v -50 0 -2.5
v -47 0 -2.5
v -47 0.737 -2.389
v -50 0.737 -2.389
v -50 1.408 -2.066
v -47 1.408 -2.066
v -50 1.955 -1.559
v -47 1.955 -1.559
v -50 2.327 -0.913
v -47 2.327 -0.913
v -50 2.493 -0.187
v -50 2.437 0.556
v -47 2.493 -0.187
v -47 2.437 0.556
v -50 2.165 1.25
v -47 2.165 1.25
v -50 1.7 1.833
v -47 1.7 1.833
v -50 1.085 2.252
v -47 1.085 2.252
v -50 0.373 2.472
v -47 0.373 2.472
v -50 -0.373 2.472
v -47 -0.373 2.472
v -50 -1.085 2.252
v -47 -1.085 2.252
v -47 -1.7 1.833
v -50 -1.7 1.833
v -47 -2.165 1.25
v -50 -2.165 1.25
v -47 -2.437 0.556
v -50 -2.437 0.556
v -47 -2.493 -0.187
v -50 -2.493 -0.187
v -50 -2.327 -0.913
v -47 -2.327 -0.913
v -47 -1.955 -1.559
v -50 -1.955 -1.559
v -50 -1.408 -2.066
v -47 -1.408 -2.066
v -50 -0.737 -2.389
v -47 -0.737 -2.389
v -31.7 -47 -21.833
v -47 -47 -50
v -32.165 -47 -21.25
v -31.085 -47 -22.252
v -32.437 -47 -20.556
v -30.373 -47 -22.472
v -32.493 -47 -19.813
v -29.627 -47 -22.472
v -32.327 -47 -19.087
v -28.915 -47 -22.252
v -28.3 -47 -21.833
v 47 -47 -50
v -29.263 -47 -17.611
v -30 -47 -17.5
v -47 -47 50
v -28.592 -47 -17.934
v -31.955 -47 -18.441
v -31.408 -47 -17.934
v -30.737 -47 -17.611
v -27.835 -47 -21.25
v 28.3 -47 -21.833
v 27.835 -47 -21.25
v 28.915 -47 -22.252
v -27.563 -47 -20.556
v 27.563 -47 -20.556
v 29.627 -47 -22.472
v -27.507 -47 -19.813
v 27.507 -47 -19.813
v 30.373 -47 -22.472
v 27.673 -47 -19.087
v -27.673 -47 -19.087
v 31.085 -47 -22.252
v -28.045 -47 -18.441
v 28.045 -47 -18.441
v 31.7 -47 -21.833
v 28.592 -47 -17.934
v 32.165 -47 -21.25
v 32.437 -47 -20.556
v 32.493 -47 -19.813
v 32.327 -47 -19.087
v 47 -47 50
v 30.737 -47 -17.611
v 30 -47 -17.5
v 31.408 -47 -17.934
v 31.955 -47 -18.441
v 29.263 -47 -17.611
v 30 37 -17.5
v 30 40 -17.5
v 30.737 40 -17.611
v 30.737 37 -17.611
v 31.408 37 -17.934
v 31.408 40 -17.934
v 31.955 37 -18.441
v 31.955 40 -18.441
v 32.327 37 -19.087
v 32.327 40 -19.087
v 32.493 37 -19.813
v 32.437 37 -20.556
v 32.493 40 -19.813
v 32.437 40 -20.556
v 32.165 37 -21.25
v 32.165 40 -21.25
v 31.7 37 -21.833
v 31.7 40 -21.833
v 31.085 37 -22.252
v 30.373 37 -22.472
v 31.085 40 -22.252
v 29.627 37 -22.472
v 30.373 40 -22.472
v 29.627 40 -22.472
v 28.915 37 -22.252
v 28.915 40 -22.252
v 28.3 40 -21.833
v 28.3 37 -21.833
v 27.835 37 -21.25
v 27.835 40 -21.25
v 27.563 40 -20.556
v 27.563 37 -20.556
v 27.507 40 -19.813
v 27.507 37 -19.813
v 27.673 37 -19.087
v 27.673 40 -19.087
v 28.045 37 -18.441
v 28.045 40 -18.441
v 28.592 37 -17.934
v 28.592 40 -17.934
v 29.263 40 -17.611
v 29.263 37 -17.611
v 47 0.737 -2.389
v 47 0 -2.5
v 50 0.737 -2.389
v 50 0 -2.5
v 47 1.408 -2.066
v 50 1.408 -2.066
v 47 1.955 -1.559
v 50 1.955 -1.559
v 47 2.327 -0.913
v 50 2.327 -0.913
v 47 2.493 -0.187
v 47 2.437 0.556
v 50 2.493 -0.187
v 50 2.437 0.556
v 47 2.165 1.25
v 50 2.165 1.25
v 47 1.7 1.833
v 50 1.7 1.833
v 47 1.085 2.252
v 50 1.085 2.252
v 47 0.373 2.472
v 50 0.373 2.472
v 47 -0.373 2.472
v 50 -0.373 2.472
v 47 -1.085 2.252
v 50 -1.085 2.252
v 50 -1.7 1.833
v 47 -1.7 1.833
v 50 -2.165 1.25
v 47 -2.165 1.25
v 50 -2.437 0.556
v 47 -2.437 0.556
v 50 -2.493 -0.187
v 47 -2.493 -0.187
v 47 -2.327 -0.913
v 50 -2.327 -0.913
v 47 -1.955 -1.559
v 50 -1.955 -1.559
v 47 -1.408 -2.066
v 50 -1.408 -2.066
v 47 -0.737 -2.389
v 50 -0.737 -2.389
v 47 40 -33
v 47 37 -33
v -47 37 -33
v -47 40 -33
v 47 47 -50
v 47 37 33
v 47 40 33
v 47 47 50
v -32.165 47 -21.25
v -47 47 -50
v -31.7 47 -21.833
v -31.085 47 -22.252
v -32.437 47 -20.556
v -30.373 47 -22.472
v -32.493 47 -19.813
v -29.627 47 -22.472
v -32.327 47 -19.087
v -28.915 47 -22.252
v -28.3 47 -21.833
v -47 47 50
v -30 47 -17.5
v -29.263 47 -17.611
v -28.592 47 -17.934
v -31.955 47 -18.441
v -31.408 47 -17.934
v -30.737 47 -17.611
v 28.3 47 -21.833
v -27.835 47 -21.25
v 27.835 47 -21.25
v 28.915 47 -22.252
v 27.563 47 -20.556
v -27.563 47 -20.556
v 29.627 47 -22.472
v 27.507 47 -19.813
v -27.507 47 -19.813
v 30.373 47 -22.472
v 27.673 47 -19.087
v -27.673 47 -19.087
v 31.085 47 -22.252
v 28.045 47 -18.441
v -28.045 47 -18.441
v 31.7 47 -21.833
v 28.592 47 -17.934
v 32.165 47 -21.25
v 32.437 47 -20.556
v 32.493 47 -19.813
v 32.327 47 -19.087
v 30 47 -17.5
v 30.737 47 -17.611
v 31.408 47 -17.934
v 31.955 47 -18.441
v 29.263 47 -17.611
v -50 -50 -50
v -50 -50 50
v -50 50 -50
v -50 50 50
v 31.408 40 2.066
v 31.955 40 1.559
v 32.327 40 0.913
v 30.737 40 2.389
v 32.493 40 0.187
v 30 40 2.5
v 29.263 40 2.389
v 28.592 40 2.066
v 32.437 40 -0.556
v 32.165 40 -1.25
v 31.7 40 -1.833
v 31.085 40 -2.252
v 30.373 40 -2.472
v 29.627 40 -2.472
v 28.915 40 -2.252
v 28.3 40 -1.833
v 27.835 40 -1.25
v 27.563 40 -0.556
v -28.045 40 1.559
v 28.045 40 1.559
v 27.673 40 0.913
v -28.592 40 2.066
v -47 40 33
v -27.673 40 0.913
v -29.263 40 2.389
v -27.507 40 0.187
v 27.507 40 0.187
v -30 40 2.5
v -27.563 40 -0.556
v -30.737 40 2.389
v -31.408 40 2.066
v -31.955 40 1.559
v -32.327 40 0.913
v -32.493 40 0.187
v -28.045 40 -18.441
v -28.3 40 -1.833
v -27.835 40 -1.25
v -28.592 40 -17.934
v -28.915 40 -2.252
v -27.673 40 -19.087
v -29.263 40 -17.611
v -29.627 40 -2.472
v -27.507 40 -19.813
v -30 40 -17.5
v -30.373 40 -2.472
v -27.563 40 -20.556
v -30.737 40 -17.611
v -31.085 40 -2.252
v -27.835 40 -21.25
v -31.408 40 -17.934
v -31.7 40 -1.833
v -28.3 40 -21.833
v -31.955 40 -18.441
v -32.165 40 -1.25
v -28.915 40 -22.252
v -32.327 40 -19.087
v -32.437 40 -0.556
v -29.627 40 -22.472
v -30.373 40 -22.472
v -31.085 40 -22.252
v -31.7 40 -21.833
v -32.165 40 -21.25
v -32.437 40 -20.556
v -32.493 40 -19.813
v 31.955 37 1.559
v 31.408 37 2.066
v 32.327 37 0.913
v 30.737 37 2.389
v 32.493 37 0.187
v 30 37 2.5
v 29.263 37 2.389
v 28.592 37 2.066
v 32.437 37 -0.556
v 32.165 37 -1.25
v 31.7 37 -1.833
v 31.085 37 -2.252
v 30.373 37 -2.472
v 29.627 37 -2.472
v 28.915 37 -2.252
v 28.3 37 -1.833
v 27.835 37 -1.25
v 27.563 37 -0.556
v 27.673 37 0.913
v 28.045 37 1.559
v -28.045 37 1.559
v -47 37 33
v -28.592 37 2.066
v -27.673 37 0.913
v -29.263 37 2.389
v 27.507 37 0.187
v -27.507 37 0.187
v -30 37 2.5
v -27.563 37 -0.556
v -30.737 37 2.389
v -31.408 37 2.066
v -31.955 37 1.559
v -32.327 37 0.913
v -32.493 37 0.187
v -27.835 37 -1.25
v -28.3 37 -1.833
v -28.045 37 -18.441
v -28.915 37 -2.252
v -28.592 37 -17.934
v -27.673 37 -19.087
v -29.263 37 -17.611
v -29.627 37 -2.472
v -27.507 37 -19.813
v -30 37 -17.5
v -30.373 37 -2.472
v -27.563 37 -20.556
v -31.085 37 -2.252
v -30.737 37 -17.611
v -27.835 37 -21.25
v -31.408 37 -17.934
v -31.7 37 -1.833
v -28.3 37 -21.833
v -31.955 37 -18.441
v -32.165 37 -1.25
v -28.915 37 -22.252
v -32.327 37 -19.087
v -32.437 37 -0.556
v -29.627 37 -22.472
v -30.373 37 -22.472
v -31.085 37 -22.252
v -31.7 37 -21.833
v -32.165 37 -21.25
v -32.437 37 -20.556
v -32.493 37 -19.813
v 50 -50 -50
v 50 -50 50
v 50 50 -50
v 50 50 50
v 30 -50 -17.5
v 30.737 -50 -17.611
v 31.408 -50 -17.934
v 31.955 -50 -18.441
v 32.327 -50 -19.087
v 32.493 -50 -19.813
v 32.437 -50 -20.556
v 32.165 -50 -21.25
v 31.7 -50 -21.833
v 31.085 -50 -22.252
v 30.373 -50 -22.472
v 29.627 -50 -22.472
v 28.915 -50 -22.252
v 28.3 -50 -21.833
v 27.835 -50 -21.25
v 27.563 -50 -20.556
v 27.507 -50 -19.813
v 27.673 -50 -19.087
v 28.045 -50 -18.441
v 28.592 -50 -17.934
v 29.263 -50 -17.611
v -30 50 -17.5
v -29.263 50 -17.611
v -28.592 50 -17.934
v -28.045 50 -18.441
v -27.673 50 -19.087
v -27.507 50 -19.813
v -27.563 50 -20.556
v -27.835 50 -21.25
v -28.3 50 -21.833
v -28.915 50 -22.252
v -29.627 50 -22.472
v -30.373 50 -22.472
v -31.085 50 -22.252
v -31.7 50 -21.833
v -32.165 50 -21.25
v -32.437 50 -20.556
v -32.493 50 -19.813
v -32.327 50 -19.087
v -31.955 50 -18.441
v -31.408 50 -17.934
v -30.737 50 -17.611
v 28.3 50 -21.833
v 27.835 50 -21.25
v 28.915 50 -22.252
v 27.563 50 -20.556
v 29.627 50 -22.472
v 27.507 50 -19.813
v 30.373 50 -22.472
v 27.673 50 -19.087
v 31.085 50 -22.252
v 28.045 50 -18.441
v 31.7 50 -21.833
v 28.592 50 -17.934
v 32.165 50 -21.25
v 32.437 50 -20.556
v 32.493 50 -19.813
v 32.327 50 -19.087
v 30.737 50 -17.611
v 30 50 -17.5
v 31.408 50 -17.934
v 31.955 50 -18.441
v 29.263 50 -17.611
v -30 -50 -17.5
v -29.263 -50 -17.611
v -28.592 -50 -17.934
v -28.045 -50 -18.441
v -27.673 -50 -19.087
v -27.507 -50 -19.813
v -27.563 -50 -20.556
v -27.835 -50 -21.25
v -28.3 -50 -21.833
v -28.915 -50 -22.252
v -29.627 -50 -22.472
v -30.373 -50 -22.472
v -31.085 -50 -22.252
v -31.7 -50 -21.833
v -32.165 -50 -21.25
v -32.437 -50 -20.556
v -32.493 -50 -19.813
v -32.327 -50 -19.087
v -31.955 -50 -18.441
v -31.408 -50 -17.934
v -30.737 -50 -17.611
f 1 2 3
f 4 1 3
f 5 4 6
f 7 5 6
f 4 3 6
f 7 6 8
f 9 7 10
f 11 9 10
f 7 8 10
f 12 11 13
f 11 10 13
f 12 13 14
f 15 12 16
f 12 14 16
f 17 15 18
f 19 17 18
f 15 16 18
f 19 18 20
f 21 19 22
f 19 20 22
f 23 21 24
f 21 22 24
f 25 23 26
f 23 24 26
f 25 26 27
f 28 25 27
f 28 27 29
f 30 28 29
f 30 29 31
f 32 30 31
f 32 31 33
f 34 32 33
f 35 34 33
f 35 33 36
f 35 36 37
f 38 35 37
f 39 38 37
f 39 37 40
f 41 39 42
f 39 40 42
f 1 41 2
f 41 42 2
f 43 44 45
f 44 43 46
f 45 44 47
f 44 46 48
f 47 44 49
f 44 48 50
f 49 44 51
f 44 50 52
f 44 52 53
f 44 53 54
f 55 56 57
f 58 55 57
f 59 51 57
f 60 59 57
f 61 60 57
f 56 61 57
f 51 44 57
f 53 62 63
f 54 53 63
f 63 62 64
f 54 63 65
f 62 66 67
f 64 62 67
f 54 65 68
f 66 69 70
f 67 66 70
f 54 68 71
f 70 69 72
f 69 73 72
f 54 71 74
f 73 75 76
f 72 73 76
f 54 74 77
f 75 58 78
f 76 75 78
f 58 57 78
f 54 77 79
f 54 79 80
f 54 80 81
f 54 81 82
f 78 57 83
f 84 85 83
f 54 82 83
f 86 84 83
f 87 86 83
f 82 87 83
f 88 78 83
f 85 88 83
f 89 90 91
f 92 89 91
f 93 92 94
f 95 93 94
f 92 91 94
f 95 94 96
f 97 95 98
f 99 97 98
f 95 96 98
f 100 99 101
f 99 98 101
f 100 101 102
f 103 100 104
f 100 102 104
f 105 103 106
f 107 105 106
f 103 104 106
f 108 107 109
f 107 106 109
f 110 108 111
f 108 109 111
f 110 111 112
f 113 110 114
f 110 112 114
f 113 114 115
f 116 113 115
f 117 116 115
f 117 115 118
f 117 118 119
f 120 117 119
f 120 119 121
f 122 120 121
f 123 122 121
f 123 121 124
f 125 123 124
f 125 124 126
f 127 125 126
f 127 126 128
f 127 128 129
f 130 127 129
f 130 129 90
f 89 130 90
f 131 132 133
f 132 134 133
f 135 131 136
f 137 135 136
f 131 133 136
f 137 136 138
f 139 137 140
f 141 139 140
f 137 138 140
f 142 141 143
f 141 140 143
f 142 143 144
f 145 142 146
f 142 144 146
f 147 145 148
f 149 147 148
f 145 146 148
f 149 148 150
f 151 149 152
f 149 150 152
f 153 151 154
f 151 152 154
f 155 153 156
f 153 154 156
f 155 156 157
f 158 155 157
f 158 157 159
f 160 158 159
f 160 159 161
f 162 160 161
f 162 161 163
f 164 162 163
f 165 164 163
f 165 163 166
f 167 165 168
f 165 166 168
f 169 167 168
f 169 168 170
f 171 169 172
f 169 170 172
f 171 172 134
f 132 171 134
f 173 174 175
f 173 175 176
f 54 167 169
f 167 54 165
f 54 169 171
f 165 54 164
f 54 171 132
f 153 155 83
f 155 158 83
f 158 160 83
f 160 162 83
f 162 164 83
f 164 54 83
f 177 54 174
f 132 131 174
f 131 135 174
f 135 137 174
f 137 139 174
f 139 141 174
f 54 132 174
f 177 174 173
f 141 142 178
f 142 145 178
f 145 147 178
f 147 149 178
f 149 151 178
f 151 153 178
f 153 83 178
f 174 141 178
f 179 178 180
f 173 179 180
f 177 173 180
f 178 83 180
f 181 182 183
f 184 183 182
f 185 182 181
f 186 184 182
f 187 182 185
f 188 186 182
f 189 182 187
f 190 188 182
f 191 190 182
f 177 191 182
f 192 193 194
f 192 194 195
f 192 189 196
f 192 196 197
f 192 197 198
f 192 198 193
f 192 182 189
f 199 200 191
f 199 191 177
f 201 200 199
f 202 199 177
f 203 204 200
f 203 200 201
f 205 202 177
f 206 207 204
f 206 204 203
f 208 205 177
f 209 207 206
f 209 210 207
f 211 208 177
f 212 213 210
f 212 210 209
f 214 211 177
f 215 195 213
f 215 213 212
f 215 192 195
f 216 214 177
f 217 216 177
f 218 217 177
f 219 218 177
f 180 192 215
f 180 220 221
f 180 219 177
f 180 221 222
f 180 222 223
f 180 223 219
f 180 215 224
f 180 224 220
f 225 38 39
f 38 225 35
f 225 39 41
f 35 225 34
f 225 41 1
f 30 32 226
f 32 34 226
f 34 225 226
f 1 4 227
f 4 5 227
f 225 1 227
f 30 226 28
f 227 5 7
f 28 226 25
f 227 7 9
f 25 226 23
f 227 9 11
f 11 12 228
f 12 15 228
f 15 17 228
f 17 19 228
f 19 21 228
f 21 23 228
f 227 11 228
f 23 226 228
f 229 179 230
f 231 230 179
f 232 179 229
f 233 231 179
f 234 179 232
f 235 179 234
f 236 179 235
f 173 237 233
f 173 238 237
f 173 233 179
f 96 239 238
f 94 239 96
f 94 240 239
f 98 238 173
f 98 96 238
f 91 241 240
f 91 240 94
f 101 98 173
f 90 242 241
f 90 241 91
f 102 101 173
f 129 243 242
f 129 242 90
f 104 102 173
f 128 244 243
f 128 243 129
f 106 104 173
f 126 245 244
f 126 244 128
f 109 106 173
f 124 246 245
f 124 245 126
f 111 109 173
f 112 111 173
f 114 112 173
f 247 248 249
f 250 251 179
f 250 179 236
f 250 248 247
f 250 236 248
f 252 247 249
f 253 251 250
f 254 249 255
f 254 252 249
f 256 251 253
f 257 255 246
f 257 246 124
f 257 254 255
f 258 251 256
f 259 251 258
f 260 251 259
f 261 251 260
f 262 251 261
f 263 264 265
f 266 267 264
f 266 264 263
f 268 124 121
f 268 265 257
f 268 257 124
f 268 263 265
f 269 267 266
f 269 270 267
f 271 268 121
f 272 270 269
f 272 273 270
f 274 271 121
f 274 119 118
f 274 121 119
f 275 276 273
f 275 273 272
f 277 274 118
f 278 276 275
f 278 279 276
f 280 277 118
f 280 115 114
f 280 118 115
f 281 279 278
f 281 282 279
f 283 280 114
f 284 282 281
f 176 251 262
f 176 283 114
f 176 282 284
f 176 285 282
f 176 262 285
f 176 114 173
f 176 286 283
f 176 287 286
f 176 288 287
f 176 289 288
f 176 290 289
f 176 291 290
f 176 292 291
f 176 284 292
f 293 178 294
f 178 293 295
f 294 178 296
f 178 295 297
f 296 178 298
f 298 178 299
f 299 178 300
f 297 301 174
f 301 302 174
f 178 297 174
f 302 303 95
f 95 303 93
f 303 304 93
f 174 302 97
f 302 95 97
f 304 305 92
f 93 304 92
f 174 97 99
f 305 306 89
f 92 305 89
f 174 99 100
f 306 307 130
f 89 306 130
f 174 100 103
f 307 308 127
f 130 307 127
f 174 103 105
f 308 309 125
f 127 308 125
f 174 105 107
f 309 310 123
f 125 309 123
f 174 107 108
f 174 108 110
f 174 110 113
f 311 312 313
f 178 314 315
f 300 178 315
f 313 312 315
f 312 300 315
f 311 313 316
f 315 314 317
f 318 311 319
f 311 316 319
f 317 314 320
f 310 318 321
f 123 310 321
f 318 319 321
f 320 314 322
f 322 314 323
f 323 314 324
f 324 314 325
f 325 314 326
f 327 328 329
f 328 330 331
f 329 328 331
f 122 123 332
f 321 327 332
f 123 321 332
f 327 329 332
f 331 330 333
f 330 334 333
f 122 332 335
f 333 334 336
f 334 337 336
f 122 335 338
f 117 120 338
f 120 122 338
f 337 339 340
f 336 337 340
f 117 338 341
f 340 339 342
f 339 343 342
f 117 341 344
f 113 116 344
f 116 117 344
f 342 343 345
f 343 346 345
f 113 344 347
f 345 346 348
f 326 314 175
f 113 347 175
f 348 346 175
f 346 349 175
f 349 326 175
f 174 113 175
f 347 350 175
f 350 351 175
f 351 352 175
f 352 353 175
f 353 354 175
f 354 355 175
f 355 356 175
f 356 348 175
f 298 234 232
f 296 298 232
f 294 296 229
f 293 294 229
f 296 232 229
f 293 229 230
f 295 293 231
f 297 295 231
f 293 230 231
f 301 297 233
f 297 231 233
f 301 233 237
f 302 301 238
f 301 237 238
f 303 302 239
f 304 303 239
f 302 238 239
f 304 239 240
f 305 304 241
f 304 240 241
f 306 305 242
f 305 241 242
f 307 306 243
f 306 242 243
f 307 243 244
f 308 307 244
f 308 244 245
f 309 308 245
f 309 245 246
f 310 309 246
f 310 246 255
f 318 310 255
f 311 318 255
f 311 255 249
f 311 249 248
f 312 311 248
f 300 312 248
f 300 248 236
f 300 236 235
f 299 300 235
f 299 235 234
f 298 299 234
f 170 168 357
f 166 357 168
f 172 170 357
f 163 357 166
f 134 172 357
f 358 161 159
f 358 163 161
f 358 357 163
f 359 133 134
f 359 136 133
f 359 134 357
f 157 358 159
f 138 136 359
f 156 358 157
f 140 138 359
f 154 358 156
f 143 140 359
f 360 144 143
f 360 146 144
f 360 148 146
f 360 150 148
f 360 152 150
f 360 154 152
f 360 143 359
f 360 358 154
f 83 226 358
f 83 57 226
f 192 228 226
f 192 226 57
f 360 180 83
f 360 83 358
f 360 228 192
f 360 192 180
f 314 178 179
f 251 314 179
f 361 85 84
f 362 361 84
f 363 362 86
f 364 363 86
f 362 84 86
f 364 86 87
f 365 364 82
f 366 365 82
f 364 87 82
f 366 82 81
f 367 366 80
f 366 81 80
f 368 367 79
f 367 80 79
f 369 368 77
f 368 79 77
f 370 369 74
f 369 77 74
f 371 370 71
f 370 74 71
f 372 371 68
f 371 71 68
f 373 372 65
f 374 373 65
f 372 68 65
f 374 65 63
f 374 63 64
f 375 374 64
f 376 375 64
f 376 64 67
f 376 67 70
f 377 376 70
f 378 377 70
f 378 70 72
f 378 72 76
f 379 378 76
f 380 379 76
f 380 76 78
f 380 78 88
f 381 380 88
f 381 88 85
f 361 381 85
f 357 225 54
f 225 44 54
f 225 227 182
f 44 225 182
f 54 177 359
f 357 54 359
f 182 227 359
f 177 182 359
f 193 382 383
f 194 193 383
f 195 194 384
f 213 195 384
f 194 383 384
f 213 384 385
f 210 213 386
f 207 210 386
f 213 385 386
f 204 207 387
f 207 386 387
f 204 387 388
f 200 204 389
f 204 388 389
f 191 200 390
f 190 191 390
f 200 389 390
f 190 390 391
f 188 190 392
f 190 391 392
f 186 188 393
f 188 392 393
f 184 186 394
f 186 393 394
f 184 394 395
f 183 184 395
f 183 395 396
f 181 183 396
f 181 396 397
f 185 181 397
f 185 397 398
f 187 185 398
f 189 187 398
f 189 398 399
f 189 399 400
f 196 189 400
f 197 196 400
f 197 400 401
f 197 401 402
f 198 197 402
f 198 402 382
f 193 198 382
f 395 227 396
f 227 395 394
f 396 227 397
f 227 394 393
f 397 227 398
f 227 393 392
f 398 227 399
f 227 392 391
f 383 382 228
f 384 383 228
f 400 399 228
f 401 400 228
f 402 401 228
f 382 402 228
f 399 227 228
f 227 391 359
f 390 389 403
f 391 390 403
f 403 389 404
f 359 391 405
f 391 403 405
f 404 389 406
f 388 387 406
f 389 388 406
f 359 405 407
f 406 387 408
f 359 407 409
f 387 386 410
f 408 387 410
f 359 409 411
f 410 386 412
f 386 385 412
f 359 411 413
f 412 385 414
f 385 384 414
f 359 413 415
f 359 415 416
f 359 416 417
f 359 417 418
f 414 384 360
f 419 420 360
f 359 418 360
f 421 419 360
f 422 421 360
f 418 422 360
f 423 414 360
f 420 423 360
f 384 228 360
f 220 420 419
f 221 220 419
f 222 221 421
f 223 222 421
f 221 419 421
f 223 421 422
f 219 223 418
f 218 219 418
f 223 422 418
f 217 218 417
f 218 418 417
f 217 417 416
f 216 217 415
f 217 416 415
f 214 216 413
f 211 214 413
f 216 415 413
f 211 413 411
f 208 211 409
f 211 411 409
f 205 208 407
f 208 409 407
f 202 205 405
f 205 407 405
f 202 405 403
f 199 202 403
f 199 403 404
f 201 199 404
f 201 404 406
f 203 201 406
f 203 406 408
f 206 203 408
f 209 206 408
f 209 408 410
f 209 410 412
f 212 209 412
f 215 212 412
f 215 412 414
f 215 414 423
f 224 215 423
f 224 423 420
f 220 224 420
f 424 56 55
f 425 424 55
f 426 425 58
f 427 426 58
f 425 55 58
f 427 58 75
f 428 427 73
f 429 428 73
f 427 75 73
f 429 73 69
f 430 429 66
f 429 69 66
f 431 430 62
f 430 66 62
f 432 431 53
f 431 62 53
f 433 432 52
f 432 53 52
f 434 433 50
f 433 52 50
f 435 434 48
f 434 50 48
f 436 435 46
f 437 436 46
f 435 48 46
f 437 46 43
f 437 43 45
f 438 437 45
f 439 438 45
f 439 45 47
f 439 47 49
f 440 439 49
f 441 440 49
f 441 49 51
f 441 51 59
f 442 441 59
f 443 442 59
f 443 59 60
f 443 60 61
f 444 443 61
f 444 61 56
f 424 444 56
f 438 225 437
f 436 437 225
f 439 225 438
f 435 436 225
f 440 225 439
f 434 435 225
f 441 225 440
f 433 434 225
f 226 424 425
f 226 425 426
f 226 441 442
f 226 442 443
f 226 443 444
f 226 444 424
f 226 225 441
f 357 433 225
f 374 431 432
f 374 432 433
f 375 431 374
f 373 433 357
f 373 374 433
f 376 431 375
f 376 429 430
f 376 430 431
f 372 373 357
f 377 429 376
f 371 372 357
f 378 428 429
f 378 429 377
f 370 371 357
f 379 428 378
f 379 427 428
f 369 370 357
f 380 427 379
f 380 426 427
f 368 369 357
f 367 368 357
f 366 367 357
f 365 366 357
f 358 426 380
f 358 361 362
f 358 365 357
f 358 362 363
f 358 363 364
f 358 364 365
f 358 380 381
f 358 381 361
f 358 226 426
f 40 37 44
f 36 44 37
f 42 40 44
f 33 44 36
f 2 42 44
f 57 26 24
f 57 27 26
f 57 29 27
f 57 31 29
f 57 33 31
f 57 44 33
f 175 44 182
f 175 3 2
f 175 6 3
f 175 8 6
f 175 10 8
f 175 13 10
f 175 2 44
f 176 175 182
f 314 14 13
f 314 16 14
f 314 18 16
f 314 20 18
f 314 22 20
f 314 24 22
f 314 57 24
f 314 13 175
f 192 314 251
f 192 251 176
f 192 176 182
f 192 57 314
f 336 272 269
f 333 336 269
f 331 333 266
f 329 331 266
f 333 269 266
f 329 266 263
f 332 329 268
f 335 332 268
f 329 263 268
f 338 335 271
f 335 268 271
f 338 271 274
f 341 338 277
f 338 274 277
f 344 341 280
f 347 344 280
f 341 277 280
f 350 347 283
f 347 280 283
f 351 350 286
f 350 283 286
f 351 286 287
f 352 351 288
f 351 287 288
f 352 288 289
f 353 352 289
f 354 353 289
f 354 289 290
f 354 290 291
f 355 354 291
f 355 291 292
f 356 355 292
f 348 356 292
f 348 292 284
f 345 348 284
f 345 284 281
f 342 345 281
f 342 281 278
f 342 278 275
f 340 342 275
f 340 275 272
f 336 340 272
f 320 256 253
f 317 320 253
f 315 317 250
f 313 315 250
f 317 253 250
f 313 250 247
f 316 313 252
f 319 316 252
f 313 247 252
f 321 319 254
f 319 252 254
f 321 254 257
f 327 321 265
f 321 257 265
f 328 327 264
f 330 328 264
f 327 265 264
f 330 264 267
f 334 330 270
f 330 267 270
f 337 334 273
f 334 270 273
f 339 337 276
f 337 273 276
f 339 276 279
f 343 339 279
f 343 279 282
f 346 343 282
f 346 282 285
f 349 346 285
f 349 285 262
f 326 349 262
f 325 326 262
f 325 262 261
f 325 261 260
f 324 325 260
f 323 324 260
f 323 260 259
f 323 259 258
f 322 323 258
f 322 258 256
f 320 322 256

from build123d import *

# Parameters (mm, degrees)
SKETCH_1_W          = 100
SKETCH_1_H          = 100
SKETCH_1_W_2        = 94
SKETCH_1_H_2        = 94
EXTRUDE_1_DEPTH     = 50
EXTRUDE_2_REACH     = 122.037
SKETCH_4_W          = 66
SKETCH_4_H          = 3
SKETCH_2_R          = 2.5
CUT_EXTRUDE_1_DEPTH = 50
SKETCH_9_R          = 2.5
CUT_EXTRUDE_5_DEPTH = 123.474487139
SKETCH_10_R         = 2.5
CUT_EXTRUDE_6_DEPTH = 20


with BuildPart() as part:
    # 草圖1 → 填料-伸長1 (new, symmetric)
    with BuildSketch(Plane.XY):
        Rectangle(SKETCH_1_W, SKETCH_1_H)
        Rectangle(SKETCH_1_W_2, SKETCH_1_H_2, mode=Mode.SUBTRACT)
    extrude(amount=EXTRUDE_1_DEPTH, both=True)

    # 草圖4 → 填料-伸長2 (add, up to next)
    with BuildSketch(Plane(origin=(-47, 0, 0), x_dir=(0, 0, -1), z_dir=(1, 0, 0)), mode=Mode.PRIVATE) as extrude_2_sk1:
        with Locations((0, 38.5)):
            Rectangle(SKETCH_4_W, SKETCH_4_H)
    extrude_2_tool1 = extrude(extrude_2_sk1.sketch, amount=EXTRUDE_2_REACH, mode=Mode.PRIVATE) - part.part
    add(extrude_2_tool1.solids().sort_by_distance((-47, 38.5, 0))[0])

    # 草圖2 → 除料-伸長1 (cut, symmetric)
    with BuildSketch(Plane(origin=(0, 0, 0), x_dir=(0, 0, -1), z_dir=(1, 0, 0))):
        Circle(SKETCH_2_R)
    extrude(amount=CUT_EXTRUDE_1_DEPTH, both=True, mode=Mode.SUBTRACT)

    # 草圖9 → 除料-伸長5 (cut, through all)
    with BuildSketch(Plane(origin=(0, 50, 0), x_dir=(1, 0, 0), z_dir=(0, 1, 0))):
        with Locations(Location((-30, 20, 0), (0, 0, 270))):
            Circle(SKETCH_9_R)
        with Locations(Location((30, 20, 0), (0, 0, 270))):
            Circle(SKETCH_9_R)
    extrude(amount=-CUT_EXTRUDE_5_DEPTH, mode=Mode.SUBTRACT)

    # 草圖10 → 除料-伸長6 (cut)
    with BuildSketch(Plane(origin=(0, 40, 0), x_dir=(1, 0, 0), z_dir=(0, 1, 0))):
        with Locations(Location((-30, 0, 0), (0, 0, 270))):
            Circle(SKETCH_10_R)
        with Locations(Location((30, 0, 0), (0, 0, 270))):
            Circle(SKETCH_10_R)
    extrude(amount=-CUT_EXTRUDE_6_DEPTH, mode=Mode.SUBTRACT)


solid = part.part
